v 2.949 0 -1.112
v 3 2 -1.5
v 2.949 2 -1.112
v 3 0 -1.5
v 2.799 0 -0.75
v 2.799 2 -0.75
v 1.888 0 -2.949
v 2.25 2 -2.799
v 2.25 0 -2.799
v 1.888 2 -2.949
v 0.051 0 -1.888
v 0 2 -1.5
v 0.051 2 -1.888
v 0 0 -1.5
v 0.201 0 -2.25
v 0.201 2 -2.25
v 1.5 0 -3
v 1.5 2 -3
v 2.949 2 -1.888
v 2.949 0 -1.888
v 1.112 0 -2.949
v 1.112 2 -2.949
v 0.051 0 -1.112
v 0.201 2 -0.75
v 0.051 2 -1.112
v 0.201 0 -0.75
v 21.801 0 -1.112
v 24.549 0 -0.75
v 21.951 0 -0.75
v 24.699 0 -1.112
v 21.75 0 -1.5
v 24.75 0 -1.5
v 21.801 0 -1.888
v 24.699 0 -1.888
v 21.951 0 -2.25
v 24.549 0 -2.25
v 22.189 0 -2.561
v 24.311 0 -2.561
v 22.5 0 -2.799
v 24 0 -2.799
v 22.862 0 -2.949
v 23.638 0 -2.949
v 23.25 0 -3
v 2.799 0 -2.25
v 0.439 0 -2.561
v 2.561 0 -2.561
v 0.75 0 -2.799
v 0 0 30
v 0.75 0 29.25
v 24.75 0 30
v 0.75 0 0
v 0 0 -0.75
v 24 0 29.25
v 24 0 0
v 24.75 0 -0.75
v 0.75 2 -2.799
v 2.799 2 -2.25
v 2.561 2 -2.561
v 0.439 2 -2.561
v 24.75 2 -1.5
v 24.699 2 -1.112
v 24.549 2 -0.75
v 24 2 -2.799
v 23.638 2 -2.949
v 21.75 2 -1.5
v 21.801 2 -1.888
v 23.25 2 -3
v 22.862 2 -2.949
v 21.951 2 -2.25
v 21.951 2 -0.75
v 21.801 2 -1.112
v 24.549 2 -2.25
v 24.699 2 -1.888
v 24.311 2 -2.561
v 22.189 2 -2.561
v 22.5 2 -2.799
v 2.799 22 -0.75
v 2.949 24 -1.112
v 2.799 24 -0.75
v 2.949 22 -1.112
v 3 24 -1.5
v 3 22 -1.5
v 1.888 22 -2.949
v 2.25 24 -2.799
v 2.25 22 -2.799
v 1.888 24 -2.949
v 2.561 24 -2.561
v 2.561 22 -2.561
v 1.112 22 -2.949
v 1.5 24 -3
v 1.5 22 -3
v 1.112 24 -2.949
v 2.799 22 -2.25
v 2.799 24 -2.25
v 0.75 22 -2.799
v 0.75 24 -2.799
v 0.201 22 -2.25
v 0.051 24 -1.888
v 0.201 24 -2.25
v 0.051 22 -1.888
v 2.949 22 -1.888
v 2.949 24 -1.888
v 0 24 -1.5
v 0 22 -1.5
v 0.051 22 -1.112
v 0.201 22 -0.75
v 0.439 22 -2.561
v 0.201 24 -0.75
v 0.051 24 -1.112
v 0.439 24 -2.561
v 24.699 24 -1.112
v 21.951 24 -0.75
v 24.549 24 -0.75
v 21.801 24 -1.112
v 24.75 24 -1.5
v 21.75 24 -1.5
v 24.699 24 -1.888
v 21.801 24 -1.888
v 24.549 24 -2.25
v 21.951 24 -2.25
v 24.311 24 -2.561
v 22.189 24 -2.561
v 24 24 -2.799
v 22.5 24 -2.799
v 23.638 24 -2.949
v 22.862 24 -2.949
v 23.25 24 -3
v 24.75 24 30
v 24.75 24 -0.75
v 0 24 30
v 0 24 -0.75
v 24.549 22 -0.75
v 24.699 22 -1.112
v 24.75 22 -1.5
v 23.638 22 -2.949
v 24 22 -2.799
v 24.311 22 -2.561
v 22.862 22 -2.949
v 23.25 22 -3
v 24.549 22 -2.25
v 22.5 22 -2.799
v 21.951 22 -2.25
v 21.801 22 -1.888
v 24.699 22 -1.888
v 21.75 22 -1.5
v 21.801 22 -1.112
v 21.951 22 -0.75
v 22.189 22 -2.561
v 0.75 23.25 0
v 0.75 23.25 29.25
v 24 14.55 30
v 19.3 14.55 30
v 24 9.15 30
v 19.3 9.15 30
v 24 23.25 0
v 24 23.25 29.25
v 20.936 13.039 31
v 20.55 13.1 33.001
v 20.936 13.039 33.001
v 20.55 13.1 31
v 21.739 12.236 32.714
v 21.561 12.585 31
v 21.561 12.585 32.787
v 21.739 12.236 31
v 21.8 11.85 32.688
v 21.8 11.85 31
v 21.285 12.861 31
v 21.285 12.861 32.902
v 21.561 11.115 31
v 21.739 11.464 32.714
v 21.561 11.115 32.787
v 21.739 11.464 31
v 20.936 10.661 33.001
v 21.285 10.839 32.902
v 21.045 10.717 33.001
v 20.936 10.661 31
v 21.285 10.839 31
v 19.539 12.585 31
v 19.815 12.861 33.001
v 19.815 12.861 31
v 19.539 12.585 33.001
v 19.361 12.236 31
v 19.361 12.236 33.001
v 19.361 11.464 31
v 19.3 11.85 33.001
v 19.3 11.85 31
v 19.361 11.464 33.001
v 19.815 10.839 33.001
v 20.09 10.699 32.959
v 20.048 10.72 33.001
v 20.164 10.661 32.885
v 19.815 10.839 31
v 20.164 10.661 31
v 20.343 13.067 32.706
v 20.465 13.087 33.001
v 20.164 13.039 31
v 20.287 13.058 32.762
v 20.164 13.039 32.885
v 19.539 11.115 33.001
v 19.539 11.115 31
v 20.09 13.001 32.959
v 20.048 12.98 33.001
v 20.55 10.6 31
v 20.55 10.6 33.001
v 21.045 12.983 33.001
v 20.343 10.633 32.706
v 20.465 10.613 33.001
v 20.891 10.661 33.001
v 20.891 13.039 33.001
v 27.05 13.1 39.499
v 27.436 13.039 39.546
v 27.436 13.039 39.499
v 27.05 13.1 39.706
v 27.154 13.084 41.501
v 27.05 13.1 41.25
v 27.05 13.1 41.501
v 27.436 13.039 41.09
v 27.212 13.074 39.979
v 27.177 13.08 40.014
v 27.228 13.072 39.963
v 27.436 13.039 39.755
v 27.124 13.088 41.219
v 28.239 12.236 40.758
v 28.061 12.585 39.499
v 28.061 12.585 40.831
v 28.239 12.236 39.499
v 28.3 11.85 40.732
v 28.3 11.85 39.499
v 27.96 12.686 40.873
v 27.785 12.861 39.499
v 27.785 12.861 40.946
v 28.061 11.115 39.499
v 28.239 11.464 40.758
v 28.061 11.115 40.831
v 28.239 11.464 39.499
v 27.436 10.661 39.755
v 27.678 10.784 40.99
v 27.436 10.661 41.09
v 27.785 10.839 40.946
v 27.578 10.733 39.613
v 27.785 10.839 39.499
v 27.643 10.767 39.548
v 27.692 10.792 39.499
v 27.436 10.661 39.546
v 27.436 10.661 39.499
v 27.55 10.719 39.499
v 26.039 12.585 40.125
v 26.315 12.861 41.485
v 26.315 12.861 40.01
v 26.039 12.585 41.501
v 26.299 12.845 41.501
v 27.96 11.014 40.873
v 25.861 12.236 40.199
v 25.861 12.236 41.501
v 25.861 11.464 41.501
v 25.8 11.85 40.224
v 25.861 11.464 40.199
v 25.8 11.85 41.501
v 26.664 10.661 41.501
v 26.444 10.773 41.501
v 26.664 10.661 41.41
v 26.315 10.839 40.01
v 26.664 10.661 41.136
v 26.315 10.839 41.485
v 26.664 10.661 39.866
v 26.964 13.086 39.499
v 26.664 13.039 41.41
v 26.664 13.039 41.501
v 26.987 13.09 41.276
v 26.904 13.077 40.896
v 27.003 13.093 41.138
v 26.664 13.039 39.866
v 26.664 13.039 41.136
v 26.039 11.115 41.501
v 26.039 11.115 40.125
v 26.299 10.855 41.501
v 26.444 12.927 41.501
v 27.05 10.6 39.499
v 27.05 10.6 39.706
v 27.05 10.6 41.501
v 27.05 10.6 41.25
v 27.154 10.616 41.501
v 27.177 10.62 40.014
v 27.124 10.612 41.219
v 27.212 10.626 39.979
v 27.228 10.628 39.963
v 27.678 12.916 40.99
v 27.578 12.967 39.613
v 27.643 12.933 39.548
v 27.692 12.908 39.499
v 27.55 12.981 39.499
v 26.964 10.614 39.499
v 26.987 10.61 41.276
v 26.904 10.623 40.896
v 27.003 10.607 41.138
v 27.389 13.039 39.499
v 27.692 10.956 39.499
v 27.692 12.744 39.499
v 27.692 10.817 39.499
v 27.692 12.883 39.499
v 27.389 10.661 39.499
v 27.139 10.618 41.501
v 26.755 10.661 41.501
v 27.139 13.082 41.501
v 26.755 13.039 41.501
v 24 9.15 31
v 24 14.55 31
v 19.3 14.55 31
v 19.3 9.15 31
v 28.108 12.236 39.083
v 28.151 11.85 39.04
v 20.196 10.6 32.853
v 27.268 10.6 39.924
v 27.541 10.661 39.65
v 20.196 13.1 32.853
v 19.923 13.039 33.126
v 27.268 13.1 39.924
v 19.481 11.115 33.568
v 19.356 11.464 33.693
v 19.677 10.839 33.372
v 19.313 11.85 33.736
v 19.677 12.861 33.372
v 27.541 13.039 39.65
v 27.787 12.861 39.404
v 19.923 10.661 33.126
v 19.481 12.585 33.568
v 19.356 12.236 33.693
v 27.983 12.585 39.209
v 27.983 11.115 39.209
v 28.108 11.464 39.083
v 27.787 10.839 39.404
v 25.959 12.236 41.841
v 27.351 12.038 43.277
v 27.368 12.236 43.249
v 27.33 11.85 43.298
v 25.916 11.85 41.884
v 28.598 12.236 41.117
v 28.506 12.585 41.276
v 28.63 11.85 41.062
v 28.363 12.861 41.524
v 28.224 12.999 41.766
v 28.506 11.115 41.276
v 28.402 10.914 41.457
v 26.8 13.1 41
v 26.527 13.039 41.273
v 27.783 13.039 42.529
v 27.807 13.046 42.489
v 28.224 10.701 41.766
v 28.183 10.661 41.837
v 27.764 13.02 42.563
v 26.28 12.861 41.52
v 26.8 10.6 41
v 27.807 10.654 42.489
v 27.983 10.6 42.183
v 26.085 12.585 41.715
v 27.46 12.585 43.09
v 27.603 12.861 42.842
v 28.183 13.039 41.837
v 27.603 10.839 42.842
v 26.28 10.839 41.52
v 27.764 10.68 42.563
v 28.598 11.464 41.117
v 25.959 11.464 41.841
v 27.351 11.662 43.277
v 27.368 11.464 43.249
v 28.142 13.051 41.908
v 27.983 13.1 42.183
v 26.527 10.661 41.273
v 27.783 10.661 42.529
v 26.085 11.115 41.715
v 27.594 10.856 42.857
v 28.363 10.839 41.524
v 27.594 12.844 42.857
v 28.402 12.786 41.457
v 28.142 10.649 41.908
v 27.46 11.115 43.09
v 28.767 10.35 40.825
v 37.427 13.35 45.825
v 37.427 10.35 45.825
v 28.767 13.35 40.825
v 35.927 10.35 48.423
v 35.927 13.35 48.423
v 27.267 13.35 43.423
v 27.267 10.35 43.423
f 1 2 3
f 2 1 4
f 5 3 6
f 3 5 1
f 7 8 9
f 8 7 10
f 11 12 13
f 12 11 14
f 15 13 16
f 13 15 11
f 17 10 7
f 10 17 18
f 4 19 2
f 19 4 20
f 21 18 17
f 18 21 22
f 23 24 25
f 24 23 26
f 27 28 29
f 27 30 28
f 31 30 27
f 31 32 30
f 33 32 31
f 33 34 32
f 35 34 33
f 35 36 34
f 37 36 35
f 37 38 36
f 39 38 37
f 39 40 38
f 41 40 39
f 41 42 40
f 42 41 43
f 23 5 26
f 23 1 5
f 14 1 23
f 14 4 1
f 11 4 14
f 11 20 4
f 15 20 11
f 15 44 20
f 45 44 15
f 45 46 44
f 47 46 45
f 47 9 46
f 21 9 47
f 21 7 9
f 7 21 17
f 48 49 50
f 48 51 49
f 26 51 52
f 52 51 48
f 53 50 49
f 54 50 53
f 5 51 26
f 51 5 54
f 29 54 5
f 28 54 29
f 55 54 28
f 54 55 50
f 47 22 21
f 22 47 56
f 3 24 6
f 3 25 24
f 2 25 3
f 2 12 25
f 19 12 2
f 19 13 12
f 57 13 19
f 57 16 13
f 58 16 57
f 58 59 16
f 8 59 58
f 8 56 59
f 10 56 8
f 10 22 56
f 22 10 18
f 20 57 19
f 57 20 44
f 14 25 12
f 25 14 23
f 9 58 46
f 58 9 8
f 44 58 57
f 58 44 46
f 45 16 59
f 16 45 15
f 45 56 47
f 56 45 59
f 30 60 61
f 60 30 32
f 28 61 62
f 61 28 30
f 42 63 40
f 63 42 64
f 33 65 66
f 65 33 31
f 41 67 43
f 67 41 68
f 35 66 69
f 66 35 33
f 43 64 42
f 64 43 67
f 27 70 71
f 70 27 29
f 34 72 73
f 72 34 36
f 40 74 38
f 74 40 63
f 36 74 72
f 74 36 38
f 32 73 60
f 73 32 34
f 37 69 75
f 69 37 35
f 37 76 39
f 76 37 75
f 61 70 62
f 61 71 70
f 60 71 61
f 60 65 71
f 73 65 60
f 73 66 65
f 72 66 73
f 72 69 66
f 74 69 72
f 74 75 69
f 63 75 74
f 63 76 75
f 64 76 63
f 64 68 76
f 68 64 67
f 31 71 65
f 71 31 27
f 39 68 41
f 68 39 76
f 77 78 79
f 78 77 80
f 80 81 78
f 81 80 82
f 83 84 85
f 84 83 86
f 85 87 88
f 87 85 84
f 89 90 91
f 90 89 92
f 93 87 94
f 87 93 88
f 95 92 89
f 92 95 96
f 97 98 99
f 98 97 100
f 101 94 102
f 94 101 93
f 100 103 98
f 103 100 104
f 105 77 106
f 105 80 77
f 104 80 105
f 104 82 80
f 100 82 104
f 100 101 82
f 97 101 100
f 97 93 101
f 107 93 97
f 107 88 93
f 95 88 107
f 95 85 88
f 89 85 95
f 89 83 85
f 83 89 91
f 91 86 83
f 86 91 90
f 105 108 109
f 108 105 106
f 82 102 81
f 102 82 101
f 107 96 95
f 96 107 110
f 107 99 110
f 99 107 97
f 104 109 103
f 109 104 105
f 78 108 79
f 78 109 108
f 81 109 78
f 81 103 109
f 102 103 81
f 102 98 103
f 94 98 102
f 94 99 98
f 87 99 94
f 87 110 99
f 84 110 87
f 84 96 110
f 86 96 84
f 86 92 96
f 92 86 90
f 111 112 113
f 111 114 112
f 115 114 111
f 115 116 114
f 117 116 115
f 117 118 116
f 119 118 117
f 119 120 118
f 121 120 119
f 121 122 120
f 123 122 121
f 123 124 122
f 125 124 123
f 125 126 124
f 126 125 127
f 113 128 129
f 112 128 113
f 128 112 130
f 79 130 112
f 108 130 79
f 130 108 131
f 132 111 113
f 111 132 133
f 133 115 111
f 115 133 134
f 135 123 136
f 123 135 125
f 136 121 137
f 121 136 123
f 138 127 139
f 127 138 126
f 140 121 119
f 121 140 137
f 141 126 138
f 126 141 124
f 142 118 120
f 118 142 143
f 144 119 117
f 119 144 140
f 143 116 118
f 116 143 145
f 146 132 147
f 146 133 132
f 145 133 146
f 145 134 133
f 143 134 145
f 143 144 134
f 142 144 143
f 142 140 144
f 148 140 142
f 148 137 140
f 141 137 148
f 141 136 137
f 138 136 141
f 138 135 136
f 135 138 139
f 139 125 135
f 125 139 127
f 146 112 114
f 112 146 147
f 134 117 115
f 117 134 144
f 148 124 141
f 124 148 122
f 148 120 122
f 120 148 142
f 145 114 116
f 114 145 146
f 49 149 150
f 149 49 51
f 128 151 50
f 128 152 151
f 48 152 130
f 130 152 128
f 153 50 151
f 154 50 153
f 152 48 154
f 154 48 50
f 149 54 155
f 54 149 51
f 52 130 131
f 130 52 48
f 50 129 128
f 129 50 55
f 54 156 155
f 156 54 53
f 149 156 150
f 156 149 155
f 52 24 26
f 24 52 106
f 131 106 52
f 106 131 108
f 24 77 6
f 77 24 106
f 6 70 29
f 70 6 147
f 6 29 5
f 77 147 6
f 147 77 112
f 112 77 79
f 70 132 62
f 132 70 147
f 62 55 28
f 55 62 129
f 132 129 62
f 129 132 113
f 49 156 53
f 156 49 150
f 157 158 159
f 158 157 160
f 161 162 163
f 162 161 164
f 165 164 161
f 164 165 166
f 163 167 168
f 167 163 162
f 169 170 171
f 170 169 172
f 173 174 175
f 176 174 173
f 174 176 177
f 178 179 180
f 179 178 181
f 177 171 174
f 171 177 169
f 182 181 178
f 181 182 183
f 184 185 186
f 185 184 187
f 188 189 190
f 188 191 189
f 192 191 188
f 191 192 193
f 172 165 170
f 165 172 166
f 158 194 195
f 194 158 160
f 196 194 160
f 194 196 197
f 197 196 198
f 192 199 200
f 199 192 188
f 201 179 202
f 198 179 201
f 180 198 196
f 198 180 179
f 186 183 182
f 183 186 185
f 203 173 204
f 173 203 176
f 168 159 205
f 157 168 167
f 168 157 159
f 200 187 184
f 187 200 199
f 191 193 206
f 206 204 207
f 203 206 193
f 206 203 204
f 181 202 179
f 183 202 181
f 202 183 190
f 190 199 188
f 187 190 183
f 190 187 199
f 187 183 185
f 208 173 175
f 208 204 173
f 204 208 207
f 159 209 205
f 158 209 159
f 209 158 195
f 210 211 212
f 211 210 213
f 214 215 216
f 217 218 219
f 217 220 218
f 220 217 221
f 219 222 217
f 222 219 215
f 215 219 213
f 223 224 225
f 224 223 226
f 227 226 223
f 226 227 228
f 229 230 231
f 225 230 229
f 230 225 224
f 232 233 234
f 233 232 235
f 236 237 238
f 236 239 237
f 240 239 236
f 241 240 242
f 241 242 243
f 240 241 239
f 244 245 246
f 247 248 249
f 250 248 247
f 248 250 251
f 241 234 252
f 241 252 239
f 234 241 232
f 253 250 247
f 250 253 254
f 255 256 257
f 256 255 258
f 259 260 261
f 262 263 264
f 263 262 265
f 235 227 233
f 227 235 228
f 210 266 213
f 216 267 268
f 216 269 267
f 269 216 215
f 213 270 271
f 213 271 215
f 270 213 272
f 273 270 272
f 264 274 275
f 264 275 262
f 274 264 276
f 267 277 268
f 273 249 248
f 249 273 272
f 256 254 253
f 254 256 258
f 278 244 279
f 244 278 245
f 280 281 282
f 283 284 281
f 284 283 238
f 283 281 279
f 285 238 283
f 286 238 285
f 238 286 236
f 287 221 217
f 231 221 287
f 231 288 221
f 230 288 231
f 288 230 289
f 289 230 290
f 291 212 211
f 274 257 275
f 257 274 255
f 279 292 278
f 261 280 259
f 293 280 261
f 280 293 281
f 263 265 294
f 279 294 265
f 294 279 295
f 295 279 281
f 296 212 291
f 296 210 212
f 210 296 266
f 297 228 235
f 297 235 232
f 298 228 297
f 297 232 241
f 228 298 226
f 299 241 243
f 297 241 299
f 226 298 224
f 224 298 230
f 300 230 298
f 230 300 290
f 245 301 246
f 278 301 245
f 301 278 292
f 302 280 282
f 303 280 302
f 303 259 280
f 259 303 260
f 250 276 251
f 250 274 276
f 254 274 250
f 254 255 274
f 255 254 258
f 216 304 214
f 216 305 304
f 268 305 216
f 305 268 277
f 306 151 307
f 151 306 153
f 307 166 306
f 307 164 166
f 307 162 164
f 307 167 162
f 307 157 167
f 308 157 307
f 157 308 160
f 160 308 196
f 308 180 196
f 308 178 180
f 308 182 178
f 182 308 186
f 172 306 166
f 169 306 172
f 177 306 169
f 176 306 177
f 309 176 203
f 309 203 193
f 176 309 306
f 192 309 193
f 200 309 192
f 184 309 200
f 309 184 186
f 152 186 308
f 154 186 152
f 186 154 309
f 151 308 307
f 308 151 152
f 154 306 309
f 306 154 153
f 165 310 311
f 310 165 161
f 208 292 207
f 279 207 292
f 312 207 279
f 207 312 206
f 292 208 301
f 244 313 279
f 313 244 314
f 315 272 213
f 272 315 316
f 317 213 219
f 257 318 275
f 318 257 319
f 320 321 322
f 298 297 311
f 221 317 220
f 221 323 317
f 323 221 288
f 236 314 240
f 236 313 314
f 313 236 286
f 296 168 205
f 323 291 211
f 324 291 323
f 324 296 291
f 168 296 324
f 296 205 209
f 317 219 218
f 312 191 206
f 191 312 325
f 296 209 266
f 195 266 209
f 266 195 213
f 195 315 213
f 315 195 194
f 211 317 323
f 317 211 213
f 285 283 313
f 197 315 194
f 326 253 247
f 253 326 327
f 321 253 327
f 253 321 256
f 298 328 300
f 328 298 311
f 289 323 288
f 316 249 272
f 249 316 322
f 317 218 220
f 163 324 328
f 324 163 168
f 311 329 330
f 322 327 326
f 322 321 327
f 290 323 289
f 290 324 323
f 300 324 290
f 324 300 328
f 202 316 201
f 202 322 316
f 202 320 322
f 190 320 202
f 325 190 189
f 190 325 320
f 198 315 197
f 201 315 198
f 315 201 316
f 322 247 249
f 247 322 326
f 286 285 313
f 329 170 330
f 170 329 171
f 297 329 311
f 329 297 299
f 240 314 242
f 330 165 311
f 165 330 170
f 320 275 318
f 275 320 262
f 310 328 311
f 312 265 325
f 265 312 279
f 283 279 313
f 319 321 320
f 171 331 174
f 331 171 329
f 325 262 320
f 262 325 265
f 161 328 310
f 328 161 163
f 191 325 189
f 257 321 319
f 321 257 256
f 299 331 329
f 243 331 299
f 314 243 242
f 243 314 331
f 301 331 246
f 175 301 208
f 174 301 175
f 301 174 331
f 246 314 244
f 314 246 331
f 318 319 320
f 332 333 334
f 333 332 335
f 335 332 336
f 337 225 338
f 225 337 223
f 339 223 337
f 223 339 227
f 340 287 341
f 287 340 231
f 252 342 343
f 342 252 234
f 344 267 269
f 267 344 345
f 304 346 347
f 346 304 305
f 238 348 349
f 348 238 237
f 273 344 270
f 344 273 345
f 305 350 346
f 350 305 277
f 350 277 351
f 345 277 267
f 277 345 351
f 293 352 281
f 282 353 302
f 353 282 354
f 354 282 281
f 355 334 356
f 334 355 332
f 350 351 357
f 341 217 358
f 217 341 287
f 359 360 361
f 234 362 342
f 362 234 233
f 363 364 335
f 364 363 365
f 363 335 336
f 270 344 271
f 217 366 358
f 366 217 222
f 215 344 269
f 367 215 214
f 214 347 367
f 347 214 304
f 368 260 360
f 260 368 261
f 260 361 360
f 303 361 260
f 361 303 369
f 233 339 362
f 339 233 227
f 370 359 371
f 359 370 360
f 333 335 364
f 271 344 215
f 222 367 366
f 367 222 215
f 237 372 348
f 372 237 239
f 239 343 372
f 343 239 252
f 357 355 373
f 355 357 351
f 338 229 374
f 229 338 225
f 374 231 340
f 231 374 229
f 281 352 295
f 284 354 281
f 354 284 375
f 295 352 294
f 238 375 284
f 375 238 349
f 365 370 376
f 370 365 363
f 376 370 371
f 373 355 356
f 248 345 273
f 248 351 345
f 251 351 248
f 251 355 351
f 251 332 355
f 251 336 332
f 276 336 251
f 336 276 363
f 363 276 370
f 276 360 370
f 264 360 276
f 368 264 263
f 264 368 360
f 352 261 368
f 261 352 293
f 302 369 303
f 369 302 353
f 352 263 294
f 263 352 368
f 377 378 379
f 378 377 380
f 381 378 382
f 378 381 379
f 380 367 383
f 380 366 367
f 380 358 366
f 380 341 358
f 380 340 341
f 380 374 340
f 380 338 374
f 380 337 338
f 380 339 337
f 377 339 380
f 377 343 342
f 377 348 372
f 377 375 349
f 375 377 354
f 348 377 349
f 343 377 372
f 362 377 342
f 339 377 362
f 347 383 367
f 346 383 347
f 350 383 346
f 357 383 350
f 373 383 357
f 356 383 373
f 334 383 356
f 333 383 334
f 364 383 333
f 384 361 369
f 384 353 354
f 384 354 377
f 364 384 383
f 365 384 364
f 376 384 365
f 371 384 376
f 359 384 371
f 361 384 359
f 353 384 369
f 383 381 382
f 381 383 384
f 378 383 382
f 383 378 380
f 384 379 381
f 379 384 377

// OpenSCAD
$fa = 1;
$fs = 0.4;

// slider widget for number in range
angle1 = 60; // [10:100]

cart();
translate([ 24 - 4.7, 24 / 2 - 5.7 / 2, 30 ]) articulator();

module cart() {
    sheet_thickness = .75; // Nominal , not actual
    height = 30;
    depth = 24;
    width = 24;

    // sides
    sheet(height, depth);
    translate([ width, 0, 0 ]) sheet(height, depth);
    // back
    color("blue", 1) translate([ 0, depth, 0 ]) rotate(-90, [ 0, 0, 1 ])
        sheet(height, width);

    // bottom and top
    rotate(90, [ 0, 1, 0 ]) sheet(width + sheet_thickness, depth);
    translate([ 0, 0, height ]) rotate(90, [ 0, 1, 0 ])
        sheet(width + sheet_thickness, depth);

    // wheels
    wheel_radius = 1.5;
    wheel_depth = 2;
    two_wheels();
    translate([ 0, depth - wheel_depth, 0 ]) two_wheels();

    module sheet(height, depth) { cube([ sheet_thickness, depth, height ]); }

    module two_wheels() {
        translate([ wheel_radius, wheel_depth, -wheel_radius ])
            rotate(90, [ 1, 0, 0 ]) cylinder(h = 2, r = wheel_radius);
        translate([
            wheel_radius + 24 - 2 * wheel_radius + sheet_thickness, wheel_depth,
            -wheel_radius
        ]) rotate(90, [ 1, 0, 0 ]) cylinder(h = 2, r = wheel_radius);
    }
}

module articulator() {

    // base
    color("green", 1) cube([ 4.7, 5.4, 1 ]);

    module pivot() {
        color("green", 1) translate([ 1.25, 5.4 / 2, 1 - .001 ])
            cylinder(h = 1 + .002, r = 1.25);
        translate([ 1.25, 5.4 / 2, 2 - .001 ]) cylinder(h = 1 + .002, r = 1.25);
    }

    // pivot1
    pivot();
    // arm1
    translate([ 1.25, 5.4 / 2, 2.5 - .001 ]) rotate(45, [ 0, 1, 0 ])
        translate([ -.5, 0, 0 ]) cylinder(h = 10, r = 1.25);
    // pivot2
    translate([ 6.5, 0, 8.5 ]) pivot();
    // short 45deg section
    translate([ 7.5, 5.4 / 2, 8.5 + 2.5 ]) rotate(45, [ 0, 1, 0 ])
        cylinder(h = 2, r = 1.25);

    translate([ 8.5, 5.4 / 2 - 1.25 - .25, 8.5 + 2.5 + 2.5 ])
        rotate(angle1, [ 0, 1, 0 ]) translate([ -.2, 0, -.5 ])
            cube([ 3, 3, 10 ]);
}

x1 = 5.4;
z1 = 9.7;

// reset vp

//$vpr=[52.9, 0, 34.6];
//$vpt=[18.817, -11.4073, 22.8374];
//$vpd=268.585;

//$vpr=[60, 0, 27.5];
//$vpt=[10.35, -13, 13];
//$vpf=26;
//$vpd=22;
